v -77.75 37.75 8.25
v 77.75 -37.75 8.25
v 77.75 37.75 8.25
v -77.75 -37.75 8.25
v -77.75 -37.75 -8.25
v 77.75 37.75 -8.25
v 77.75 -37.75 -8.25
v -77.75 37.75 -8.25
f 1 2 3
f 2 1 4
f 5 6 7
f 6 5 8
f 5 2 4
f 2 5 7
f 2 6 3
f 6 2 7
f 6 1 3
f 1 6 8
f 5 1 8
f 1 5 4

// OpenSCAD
example_phone_len = 155.5;
example_phone_wid = 75.5;
example_phone_h   = 16.5;

module example_phone() {
    cube([example_phone_len, example_phone_wid, example_phone_h], center=true);
    
}


example_phone();
